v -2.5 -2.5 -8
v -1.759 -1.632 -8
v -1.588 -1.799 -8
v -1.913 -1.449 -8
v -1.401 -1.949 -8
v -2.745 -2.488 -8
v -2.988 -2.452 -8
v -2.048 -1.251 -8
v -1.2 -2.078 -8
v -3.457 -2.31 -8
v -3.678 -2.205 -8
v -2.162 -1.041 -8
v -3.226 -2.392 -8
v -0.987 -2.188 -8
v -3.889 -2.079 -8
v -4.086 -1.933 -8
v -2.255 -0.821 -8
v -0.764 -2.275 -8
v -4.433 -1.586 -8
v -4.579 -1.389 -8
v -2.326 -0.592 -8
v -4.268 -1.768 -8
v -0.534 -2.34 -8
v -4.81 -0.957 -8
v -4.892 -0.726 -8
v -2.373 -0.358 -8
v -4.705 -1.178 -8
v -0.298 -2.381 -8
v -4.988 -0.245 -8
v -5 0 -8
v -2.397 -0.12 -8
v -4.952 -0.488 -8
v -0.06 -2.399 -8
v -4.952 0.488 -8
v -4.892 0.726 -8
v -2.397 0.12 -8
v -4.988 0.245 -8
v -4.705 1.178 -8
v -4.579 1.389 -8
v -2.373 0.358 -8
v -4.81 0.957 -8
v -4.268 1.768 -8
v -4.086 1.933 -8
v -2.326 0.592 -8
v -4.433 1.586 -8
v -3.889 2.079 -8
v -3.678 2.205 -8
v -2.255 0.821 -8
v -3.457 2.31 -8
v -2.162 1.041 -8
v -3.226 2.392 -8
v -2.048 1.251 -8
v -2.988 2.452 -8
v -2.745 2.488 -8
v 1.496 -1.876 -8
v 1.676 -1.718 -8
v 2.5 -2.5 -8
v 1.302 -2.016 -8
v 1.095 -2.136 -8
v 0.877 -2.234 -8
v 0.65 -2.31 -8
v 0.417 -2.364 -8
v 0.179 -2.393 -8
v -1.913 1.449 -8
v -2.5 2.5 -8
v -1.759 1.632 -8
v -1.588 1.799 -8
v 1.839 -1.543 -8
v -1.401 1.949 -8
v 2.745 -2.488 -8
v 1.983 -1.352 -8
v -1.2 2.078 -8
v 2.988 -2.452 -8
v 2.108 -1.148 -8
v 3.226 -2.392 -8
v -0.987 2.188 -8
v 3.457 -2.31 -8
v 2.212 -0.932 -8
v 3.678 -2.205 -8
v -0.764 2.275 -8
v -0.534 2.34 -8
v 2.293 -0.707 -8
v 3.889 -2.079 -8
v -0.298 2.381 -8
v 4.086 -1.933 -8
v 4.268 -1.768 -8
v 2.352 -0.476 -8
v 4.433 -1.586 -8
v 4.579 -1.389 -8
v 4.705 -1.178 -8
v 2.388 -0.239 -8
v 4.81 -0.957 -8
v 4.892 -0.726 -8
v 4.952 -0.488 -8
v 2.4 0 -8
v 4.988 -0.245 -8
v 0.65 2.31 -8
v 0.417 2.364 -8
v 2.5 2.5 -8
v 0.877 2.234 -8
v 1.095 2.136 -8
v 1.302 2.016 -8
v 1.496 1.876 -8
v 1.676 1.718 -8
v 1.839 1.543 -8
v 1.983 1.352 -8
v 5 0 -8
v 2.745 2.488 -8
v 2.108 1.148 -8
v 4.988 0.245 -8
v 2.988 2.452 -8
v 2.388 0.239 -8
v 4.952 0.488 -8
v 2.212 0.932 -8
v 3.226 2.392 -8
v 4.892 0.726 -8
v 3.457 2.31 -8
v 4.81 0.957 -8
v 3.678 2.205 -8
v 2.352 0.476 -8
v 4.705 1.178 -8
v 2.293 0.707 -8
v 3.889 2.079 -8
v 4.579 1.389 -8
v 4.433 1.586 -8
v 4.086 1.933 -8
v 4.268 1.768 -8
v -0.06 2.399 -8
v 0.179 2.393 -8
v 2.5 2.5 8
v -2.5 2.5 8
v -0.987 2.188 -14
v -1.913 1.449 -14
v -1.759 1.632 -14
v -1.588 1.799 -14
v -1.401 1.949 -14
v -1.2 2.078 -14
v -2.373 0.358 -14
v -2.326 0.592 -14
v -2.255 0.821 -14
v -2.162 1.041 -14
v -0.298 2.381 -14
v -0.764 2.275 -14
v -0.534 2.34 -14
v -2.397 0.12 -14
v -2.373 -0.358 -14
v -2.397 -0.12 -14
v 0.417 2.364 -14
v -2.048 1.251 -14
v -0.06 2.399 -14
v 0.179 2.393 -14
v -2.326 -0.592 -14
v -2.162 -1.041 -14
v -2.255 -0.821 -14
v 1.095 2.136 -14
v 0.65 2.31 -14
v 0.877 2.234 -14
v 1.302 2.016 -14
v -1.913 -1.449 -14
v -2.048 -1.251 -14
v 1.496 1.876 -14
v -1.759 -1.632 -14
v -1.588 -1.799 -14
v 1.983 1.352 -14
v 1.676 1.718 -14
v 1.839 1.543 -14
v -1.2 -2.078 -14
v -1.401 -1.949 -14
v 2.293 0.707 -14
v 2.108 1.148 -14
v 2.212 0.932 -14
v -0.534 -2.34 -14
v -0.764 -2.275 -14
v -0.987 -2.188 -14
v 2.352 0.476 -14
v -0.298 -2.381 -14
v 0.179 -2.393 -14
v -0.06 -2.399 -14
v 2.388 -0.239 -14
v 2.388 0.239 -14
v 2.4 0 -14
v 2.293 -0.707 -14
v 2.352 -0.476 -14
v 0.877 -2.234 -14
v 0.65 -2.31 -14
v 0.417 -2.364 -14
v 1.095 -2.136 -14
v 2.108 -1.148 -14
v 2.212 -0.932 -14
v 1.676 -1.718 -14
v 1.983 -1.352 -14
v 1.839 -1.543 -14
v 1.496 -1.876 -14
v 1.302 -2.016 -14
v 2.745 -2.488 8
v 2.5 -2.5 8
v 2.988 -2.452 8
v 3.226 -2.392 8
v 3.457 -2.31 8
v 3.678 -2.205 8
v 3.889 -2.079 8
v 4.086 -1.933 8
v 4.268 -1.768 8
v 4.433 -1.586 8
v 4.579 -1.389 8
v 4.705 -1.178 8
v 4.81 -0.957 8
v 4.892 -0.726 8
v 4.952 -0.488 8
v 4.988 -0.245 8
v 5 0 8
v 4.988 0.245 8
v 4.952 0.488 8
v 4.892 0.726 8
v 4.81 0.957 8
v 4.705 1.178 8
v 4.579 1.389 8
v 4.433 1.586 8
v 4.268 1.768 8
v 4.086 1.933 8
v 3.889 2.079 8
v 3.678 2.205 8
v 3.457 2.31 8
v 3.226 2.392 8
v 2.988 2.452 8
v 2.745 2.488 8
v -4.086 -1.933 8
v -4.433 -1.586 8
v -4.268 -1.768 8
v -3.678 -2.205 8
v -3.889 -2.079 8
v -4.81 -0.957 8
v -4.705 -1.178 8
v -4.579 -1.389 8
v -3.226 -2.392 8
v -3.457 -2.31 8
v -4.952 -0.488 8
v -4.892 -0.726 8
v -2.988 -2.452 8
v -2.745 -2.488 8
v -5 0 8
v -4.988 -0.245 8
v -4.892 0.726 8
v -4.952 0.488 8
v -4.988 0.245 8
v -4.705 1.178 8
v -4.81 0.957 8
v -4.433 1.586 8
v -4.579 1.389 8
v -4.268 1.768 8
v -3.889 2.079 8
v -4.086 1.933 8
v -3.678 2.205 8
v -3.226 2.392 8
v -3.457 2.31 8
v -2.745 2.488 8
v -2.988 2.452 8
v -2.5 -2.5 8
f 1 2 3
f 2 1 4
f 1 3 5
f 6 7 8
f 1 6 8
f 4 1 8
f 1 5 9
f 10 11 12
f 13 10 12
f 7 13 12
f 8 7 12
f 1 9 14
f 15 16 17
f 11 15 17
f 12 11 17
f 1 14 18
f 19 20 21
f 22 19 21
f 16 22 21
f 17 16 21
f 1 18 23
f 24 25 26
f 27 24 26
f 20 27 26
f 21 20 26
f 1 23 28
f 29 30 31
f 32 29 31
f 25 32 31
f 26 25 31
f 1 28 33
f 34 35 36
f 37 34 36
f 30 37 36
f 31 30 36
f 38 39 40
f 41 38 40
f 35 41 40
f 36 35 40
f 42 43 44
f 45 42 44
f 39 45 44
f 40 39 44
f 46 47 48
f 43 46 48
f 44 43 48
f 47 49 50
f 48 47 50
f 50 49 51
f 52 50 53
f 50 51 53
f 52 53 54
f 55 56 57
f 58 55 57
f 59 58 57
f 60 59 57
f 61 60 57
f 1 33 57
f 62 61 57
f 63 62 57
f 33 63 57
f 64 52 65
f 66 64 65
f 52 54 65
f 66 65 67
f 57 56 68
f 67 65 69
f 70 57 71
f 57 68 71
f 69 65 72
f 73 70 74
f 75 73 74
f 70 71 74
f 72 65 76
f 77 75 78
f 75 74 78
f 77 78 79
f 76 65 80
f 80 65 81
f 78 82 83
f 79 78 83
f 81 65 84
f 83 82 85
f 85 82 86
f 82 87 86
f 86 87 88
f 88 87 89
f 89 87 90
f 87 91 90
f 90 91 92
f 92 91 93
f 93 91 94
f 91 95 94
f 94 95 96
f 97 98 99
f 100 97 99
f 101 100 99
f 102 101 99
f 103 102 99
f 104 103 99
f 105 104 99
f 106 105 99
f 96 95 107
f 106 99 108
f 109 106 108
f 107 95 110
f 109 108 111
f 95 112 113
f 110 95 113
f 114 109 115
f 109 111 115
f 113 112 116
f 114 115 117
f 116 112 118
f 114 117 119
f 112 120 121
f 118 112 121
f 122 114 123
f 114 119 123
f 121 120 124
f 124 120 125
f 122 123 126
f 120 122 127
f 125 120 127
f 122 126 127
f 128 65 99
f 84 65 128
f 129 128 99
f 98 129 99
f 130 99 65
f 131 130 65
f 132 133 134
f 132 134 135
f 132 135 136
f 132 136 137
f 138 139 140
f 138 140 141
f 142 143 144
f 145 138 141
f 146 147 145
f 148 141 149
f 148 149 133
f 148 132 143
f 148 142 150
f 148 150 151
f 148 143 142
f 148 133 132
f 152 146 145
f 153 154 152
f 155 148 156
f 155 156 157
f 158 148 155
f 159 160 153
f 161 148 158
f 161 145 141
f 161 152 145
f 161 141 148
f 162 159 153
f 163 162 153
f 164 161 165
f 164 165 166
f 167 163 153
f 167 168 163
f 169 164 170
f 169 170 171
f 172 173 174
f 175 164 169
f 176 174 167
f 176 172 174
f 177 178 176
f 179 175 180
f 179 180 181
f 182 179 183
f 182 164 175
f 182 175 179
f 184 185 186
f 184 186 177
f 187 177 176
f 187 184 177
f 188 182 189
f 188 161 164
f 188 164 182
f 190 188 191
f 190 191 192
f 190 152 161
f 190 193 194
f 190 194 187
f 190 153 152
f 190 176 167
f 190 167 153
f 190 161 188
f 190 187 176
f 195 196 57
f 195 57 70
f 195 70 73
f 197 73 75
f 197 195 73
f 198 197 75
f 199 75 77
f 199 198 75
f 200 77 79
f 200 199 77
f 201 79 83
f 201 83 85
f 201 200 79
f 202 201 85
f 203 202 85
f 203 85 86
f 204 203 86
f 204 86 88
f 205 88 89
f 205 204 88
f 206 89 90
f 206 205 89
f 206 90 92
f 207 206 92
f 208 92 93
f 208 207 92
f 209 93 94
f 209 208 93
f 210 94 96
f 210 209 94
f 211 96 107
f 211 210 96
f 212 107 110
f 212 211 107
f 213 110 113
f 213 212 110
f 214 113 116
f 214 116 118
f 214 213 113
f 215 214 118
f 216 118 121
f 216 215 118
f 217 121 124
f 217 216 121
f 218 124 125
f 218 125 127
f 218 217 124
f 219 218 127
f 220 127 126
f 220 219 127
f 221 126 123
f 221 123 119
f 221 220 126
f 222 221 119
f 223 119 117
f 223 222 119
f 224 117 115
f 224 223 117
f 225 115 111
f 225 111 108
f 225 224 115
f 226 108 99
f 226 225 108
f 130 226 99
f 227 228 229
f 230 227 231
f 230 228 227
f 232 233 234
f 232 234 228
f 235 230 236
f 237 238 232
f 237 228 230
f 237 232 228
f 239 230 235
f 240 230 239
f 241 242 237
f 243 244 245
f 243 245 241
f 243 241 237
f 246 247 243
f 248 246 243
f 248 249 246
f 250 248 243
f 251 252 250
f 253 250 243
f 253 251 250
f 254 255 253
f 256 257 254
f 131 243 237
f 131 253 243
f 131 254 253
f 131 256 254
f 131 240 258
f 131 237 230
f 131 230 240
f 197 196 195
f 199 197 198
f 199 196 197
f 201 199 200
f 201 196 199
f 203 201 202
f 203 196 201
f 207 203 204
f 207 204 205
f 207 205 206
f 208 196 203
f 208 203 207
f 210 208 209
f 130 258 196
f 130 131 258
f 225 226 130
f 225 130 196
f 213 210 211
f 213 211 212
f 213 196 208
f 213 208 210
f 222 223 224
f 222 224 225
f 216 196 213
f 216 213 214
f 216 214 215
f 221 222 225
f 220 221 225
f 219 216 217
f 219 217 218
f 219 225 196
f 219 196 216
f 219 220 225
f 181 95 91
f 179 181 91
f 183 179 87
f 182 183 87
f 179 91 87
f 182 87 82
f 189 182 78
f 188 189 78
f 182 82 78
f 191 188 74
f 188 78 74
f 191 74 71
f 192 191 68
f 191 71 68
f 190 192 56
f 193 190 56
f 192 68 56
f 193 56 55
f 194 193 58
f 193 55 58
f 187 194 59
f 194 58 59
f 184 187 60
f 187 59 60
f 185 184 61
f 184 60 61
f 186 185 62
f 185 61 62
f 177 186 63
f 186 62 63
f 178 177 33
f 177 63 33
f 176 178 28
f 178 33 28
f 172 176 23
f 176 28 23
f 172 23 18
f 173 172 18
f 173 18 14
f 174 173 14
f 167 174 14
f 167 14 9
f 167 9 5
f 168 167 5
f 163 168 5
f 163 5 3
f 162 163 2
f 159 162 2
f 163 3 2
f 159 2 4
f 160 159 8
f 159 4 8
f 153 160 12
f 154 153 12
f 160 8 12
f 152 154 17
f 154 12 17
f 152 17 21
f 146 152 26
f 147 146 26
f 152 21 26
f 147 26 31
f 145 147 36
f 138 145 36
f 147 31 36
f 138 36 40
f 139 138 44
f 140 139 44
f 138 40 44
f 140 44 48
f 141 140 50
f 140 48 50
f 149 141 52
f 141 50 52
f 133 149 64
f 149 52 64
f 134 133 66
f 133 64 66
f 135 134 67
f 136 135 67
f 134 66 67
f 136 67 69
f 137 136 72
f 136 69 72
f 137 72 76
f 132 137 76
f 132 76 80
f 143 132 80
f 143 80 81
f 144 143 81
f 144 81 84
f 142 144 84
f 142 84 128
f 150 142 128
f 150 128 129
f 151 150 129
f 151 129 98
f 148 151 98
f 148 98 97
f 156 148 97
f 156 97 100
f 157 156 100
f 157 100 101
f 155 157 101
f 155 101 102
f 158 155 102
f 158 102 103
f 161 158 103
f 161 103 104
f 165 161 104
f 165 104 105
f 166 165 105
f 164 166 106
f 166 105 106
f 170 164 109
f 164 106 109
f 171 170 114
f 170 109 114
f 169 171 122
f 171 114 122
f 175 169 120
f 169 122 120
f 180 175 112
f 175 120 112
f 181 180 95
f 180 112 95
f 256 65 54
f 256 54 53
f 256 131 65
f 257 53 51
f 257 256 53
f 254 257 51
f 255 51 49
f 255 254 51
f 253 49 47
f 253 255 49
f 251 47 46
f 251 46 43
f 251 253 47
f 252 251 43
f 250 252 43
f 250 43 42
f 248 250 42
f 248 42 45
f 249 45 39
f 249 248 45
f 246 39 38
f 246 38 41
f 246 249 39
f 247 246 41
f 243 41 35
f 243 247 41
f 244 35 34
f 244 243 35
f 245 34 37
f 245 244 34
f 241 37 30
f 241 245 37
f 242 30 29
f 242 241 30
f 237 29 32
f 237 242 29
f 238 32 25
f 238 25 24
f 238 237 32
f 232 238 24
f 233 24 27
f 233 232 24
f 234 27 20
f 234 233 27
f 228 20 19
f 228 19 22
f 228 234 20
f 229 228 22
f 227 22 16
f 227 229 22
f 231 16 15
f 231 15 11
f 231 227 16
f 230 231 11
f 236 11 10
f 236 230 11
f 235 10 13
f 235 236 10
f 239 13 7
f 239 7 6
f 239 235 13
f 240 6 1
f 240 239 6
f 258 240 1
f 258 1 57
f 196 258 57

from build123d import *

# Parameters (mm, degrees)
PAD_DEPTH    = 8
SKETCH001_R  = 2.4
PAD001_DEPTH = 6


with BuildPart() as part:
    # Sketch → Pad (new body, symmetric)
    with BuildSketch(Plane.XY):
        with BuildLine():
            ThreePointArc((-2.5, 2.5), (-5, 0), (-2.5, -2.5))
            Line((-2.5, -2.5), (2.5, -2.5))
            ThreePointArc((2.5, -2.5), (5, 0), (2.5, 2.5))
            Line((2.5, 2.5), (-2.5, 2.5))
        make_face()
    extrude(amount=PAD_DEPTH, both=True)

    # Sketch001 (on Face5 of Pad) → Pad001 (join)
    with BuildSketch(Plane(origin=(0, 0, -8), x_dir=(1, 0, 0), z_dir=(0, 0, -1))):
        Circle(SKETCH001_R)
    extrude(amount=PAD001_DEPTH)


solid = part.part
